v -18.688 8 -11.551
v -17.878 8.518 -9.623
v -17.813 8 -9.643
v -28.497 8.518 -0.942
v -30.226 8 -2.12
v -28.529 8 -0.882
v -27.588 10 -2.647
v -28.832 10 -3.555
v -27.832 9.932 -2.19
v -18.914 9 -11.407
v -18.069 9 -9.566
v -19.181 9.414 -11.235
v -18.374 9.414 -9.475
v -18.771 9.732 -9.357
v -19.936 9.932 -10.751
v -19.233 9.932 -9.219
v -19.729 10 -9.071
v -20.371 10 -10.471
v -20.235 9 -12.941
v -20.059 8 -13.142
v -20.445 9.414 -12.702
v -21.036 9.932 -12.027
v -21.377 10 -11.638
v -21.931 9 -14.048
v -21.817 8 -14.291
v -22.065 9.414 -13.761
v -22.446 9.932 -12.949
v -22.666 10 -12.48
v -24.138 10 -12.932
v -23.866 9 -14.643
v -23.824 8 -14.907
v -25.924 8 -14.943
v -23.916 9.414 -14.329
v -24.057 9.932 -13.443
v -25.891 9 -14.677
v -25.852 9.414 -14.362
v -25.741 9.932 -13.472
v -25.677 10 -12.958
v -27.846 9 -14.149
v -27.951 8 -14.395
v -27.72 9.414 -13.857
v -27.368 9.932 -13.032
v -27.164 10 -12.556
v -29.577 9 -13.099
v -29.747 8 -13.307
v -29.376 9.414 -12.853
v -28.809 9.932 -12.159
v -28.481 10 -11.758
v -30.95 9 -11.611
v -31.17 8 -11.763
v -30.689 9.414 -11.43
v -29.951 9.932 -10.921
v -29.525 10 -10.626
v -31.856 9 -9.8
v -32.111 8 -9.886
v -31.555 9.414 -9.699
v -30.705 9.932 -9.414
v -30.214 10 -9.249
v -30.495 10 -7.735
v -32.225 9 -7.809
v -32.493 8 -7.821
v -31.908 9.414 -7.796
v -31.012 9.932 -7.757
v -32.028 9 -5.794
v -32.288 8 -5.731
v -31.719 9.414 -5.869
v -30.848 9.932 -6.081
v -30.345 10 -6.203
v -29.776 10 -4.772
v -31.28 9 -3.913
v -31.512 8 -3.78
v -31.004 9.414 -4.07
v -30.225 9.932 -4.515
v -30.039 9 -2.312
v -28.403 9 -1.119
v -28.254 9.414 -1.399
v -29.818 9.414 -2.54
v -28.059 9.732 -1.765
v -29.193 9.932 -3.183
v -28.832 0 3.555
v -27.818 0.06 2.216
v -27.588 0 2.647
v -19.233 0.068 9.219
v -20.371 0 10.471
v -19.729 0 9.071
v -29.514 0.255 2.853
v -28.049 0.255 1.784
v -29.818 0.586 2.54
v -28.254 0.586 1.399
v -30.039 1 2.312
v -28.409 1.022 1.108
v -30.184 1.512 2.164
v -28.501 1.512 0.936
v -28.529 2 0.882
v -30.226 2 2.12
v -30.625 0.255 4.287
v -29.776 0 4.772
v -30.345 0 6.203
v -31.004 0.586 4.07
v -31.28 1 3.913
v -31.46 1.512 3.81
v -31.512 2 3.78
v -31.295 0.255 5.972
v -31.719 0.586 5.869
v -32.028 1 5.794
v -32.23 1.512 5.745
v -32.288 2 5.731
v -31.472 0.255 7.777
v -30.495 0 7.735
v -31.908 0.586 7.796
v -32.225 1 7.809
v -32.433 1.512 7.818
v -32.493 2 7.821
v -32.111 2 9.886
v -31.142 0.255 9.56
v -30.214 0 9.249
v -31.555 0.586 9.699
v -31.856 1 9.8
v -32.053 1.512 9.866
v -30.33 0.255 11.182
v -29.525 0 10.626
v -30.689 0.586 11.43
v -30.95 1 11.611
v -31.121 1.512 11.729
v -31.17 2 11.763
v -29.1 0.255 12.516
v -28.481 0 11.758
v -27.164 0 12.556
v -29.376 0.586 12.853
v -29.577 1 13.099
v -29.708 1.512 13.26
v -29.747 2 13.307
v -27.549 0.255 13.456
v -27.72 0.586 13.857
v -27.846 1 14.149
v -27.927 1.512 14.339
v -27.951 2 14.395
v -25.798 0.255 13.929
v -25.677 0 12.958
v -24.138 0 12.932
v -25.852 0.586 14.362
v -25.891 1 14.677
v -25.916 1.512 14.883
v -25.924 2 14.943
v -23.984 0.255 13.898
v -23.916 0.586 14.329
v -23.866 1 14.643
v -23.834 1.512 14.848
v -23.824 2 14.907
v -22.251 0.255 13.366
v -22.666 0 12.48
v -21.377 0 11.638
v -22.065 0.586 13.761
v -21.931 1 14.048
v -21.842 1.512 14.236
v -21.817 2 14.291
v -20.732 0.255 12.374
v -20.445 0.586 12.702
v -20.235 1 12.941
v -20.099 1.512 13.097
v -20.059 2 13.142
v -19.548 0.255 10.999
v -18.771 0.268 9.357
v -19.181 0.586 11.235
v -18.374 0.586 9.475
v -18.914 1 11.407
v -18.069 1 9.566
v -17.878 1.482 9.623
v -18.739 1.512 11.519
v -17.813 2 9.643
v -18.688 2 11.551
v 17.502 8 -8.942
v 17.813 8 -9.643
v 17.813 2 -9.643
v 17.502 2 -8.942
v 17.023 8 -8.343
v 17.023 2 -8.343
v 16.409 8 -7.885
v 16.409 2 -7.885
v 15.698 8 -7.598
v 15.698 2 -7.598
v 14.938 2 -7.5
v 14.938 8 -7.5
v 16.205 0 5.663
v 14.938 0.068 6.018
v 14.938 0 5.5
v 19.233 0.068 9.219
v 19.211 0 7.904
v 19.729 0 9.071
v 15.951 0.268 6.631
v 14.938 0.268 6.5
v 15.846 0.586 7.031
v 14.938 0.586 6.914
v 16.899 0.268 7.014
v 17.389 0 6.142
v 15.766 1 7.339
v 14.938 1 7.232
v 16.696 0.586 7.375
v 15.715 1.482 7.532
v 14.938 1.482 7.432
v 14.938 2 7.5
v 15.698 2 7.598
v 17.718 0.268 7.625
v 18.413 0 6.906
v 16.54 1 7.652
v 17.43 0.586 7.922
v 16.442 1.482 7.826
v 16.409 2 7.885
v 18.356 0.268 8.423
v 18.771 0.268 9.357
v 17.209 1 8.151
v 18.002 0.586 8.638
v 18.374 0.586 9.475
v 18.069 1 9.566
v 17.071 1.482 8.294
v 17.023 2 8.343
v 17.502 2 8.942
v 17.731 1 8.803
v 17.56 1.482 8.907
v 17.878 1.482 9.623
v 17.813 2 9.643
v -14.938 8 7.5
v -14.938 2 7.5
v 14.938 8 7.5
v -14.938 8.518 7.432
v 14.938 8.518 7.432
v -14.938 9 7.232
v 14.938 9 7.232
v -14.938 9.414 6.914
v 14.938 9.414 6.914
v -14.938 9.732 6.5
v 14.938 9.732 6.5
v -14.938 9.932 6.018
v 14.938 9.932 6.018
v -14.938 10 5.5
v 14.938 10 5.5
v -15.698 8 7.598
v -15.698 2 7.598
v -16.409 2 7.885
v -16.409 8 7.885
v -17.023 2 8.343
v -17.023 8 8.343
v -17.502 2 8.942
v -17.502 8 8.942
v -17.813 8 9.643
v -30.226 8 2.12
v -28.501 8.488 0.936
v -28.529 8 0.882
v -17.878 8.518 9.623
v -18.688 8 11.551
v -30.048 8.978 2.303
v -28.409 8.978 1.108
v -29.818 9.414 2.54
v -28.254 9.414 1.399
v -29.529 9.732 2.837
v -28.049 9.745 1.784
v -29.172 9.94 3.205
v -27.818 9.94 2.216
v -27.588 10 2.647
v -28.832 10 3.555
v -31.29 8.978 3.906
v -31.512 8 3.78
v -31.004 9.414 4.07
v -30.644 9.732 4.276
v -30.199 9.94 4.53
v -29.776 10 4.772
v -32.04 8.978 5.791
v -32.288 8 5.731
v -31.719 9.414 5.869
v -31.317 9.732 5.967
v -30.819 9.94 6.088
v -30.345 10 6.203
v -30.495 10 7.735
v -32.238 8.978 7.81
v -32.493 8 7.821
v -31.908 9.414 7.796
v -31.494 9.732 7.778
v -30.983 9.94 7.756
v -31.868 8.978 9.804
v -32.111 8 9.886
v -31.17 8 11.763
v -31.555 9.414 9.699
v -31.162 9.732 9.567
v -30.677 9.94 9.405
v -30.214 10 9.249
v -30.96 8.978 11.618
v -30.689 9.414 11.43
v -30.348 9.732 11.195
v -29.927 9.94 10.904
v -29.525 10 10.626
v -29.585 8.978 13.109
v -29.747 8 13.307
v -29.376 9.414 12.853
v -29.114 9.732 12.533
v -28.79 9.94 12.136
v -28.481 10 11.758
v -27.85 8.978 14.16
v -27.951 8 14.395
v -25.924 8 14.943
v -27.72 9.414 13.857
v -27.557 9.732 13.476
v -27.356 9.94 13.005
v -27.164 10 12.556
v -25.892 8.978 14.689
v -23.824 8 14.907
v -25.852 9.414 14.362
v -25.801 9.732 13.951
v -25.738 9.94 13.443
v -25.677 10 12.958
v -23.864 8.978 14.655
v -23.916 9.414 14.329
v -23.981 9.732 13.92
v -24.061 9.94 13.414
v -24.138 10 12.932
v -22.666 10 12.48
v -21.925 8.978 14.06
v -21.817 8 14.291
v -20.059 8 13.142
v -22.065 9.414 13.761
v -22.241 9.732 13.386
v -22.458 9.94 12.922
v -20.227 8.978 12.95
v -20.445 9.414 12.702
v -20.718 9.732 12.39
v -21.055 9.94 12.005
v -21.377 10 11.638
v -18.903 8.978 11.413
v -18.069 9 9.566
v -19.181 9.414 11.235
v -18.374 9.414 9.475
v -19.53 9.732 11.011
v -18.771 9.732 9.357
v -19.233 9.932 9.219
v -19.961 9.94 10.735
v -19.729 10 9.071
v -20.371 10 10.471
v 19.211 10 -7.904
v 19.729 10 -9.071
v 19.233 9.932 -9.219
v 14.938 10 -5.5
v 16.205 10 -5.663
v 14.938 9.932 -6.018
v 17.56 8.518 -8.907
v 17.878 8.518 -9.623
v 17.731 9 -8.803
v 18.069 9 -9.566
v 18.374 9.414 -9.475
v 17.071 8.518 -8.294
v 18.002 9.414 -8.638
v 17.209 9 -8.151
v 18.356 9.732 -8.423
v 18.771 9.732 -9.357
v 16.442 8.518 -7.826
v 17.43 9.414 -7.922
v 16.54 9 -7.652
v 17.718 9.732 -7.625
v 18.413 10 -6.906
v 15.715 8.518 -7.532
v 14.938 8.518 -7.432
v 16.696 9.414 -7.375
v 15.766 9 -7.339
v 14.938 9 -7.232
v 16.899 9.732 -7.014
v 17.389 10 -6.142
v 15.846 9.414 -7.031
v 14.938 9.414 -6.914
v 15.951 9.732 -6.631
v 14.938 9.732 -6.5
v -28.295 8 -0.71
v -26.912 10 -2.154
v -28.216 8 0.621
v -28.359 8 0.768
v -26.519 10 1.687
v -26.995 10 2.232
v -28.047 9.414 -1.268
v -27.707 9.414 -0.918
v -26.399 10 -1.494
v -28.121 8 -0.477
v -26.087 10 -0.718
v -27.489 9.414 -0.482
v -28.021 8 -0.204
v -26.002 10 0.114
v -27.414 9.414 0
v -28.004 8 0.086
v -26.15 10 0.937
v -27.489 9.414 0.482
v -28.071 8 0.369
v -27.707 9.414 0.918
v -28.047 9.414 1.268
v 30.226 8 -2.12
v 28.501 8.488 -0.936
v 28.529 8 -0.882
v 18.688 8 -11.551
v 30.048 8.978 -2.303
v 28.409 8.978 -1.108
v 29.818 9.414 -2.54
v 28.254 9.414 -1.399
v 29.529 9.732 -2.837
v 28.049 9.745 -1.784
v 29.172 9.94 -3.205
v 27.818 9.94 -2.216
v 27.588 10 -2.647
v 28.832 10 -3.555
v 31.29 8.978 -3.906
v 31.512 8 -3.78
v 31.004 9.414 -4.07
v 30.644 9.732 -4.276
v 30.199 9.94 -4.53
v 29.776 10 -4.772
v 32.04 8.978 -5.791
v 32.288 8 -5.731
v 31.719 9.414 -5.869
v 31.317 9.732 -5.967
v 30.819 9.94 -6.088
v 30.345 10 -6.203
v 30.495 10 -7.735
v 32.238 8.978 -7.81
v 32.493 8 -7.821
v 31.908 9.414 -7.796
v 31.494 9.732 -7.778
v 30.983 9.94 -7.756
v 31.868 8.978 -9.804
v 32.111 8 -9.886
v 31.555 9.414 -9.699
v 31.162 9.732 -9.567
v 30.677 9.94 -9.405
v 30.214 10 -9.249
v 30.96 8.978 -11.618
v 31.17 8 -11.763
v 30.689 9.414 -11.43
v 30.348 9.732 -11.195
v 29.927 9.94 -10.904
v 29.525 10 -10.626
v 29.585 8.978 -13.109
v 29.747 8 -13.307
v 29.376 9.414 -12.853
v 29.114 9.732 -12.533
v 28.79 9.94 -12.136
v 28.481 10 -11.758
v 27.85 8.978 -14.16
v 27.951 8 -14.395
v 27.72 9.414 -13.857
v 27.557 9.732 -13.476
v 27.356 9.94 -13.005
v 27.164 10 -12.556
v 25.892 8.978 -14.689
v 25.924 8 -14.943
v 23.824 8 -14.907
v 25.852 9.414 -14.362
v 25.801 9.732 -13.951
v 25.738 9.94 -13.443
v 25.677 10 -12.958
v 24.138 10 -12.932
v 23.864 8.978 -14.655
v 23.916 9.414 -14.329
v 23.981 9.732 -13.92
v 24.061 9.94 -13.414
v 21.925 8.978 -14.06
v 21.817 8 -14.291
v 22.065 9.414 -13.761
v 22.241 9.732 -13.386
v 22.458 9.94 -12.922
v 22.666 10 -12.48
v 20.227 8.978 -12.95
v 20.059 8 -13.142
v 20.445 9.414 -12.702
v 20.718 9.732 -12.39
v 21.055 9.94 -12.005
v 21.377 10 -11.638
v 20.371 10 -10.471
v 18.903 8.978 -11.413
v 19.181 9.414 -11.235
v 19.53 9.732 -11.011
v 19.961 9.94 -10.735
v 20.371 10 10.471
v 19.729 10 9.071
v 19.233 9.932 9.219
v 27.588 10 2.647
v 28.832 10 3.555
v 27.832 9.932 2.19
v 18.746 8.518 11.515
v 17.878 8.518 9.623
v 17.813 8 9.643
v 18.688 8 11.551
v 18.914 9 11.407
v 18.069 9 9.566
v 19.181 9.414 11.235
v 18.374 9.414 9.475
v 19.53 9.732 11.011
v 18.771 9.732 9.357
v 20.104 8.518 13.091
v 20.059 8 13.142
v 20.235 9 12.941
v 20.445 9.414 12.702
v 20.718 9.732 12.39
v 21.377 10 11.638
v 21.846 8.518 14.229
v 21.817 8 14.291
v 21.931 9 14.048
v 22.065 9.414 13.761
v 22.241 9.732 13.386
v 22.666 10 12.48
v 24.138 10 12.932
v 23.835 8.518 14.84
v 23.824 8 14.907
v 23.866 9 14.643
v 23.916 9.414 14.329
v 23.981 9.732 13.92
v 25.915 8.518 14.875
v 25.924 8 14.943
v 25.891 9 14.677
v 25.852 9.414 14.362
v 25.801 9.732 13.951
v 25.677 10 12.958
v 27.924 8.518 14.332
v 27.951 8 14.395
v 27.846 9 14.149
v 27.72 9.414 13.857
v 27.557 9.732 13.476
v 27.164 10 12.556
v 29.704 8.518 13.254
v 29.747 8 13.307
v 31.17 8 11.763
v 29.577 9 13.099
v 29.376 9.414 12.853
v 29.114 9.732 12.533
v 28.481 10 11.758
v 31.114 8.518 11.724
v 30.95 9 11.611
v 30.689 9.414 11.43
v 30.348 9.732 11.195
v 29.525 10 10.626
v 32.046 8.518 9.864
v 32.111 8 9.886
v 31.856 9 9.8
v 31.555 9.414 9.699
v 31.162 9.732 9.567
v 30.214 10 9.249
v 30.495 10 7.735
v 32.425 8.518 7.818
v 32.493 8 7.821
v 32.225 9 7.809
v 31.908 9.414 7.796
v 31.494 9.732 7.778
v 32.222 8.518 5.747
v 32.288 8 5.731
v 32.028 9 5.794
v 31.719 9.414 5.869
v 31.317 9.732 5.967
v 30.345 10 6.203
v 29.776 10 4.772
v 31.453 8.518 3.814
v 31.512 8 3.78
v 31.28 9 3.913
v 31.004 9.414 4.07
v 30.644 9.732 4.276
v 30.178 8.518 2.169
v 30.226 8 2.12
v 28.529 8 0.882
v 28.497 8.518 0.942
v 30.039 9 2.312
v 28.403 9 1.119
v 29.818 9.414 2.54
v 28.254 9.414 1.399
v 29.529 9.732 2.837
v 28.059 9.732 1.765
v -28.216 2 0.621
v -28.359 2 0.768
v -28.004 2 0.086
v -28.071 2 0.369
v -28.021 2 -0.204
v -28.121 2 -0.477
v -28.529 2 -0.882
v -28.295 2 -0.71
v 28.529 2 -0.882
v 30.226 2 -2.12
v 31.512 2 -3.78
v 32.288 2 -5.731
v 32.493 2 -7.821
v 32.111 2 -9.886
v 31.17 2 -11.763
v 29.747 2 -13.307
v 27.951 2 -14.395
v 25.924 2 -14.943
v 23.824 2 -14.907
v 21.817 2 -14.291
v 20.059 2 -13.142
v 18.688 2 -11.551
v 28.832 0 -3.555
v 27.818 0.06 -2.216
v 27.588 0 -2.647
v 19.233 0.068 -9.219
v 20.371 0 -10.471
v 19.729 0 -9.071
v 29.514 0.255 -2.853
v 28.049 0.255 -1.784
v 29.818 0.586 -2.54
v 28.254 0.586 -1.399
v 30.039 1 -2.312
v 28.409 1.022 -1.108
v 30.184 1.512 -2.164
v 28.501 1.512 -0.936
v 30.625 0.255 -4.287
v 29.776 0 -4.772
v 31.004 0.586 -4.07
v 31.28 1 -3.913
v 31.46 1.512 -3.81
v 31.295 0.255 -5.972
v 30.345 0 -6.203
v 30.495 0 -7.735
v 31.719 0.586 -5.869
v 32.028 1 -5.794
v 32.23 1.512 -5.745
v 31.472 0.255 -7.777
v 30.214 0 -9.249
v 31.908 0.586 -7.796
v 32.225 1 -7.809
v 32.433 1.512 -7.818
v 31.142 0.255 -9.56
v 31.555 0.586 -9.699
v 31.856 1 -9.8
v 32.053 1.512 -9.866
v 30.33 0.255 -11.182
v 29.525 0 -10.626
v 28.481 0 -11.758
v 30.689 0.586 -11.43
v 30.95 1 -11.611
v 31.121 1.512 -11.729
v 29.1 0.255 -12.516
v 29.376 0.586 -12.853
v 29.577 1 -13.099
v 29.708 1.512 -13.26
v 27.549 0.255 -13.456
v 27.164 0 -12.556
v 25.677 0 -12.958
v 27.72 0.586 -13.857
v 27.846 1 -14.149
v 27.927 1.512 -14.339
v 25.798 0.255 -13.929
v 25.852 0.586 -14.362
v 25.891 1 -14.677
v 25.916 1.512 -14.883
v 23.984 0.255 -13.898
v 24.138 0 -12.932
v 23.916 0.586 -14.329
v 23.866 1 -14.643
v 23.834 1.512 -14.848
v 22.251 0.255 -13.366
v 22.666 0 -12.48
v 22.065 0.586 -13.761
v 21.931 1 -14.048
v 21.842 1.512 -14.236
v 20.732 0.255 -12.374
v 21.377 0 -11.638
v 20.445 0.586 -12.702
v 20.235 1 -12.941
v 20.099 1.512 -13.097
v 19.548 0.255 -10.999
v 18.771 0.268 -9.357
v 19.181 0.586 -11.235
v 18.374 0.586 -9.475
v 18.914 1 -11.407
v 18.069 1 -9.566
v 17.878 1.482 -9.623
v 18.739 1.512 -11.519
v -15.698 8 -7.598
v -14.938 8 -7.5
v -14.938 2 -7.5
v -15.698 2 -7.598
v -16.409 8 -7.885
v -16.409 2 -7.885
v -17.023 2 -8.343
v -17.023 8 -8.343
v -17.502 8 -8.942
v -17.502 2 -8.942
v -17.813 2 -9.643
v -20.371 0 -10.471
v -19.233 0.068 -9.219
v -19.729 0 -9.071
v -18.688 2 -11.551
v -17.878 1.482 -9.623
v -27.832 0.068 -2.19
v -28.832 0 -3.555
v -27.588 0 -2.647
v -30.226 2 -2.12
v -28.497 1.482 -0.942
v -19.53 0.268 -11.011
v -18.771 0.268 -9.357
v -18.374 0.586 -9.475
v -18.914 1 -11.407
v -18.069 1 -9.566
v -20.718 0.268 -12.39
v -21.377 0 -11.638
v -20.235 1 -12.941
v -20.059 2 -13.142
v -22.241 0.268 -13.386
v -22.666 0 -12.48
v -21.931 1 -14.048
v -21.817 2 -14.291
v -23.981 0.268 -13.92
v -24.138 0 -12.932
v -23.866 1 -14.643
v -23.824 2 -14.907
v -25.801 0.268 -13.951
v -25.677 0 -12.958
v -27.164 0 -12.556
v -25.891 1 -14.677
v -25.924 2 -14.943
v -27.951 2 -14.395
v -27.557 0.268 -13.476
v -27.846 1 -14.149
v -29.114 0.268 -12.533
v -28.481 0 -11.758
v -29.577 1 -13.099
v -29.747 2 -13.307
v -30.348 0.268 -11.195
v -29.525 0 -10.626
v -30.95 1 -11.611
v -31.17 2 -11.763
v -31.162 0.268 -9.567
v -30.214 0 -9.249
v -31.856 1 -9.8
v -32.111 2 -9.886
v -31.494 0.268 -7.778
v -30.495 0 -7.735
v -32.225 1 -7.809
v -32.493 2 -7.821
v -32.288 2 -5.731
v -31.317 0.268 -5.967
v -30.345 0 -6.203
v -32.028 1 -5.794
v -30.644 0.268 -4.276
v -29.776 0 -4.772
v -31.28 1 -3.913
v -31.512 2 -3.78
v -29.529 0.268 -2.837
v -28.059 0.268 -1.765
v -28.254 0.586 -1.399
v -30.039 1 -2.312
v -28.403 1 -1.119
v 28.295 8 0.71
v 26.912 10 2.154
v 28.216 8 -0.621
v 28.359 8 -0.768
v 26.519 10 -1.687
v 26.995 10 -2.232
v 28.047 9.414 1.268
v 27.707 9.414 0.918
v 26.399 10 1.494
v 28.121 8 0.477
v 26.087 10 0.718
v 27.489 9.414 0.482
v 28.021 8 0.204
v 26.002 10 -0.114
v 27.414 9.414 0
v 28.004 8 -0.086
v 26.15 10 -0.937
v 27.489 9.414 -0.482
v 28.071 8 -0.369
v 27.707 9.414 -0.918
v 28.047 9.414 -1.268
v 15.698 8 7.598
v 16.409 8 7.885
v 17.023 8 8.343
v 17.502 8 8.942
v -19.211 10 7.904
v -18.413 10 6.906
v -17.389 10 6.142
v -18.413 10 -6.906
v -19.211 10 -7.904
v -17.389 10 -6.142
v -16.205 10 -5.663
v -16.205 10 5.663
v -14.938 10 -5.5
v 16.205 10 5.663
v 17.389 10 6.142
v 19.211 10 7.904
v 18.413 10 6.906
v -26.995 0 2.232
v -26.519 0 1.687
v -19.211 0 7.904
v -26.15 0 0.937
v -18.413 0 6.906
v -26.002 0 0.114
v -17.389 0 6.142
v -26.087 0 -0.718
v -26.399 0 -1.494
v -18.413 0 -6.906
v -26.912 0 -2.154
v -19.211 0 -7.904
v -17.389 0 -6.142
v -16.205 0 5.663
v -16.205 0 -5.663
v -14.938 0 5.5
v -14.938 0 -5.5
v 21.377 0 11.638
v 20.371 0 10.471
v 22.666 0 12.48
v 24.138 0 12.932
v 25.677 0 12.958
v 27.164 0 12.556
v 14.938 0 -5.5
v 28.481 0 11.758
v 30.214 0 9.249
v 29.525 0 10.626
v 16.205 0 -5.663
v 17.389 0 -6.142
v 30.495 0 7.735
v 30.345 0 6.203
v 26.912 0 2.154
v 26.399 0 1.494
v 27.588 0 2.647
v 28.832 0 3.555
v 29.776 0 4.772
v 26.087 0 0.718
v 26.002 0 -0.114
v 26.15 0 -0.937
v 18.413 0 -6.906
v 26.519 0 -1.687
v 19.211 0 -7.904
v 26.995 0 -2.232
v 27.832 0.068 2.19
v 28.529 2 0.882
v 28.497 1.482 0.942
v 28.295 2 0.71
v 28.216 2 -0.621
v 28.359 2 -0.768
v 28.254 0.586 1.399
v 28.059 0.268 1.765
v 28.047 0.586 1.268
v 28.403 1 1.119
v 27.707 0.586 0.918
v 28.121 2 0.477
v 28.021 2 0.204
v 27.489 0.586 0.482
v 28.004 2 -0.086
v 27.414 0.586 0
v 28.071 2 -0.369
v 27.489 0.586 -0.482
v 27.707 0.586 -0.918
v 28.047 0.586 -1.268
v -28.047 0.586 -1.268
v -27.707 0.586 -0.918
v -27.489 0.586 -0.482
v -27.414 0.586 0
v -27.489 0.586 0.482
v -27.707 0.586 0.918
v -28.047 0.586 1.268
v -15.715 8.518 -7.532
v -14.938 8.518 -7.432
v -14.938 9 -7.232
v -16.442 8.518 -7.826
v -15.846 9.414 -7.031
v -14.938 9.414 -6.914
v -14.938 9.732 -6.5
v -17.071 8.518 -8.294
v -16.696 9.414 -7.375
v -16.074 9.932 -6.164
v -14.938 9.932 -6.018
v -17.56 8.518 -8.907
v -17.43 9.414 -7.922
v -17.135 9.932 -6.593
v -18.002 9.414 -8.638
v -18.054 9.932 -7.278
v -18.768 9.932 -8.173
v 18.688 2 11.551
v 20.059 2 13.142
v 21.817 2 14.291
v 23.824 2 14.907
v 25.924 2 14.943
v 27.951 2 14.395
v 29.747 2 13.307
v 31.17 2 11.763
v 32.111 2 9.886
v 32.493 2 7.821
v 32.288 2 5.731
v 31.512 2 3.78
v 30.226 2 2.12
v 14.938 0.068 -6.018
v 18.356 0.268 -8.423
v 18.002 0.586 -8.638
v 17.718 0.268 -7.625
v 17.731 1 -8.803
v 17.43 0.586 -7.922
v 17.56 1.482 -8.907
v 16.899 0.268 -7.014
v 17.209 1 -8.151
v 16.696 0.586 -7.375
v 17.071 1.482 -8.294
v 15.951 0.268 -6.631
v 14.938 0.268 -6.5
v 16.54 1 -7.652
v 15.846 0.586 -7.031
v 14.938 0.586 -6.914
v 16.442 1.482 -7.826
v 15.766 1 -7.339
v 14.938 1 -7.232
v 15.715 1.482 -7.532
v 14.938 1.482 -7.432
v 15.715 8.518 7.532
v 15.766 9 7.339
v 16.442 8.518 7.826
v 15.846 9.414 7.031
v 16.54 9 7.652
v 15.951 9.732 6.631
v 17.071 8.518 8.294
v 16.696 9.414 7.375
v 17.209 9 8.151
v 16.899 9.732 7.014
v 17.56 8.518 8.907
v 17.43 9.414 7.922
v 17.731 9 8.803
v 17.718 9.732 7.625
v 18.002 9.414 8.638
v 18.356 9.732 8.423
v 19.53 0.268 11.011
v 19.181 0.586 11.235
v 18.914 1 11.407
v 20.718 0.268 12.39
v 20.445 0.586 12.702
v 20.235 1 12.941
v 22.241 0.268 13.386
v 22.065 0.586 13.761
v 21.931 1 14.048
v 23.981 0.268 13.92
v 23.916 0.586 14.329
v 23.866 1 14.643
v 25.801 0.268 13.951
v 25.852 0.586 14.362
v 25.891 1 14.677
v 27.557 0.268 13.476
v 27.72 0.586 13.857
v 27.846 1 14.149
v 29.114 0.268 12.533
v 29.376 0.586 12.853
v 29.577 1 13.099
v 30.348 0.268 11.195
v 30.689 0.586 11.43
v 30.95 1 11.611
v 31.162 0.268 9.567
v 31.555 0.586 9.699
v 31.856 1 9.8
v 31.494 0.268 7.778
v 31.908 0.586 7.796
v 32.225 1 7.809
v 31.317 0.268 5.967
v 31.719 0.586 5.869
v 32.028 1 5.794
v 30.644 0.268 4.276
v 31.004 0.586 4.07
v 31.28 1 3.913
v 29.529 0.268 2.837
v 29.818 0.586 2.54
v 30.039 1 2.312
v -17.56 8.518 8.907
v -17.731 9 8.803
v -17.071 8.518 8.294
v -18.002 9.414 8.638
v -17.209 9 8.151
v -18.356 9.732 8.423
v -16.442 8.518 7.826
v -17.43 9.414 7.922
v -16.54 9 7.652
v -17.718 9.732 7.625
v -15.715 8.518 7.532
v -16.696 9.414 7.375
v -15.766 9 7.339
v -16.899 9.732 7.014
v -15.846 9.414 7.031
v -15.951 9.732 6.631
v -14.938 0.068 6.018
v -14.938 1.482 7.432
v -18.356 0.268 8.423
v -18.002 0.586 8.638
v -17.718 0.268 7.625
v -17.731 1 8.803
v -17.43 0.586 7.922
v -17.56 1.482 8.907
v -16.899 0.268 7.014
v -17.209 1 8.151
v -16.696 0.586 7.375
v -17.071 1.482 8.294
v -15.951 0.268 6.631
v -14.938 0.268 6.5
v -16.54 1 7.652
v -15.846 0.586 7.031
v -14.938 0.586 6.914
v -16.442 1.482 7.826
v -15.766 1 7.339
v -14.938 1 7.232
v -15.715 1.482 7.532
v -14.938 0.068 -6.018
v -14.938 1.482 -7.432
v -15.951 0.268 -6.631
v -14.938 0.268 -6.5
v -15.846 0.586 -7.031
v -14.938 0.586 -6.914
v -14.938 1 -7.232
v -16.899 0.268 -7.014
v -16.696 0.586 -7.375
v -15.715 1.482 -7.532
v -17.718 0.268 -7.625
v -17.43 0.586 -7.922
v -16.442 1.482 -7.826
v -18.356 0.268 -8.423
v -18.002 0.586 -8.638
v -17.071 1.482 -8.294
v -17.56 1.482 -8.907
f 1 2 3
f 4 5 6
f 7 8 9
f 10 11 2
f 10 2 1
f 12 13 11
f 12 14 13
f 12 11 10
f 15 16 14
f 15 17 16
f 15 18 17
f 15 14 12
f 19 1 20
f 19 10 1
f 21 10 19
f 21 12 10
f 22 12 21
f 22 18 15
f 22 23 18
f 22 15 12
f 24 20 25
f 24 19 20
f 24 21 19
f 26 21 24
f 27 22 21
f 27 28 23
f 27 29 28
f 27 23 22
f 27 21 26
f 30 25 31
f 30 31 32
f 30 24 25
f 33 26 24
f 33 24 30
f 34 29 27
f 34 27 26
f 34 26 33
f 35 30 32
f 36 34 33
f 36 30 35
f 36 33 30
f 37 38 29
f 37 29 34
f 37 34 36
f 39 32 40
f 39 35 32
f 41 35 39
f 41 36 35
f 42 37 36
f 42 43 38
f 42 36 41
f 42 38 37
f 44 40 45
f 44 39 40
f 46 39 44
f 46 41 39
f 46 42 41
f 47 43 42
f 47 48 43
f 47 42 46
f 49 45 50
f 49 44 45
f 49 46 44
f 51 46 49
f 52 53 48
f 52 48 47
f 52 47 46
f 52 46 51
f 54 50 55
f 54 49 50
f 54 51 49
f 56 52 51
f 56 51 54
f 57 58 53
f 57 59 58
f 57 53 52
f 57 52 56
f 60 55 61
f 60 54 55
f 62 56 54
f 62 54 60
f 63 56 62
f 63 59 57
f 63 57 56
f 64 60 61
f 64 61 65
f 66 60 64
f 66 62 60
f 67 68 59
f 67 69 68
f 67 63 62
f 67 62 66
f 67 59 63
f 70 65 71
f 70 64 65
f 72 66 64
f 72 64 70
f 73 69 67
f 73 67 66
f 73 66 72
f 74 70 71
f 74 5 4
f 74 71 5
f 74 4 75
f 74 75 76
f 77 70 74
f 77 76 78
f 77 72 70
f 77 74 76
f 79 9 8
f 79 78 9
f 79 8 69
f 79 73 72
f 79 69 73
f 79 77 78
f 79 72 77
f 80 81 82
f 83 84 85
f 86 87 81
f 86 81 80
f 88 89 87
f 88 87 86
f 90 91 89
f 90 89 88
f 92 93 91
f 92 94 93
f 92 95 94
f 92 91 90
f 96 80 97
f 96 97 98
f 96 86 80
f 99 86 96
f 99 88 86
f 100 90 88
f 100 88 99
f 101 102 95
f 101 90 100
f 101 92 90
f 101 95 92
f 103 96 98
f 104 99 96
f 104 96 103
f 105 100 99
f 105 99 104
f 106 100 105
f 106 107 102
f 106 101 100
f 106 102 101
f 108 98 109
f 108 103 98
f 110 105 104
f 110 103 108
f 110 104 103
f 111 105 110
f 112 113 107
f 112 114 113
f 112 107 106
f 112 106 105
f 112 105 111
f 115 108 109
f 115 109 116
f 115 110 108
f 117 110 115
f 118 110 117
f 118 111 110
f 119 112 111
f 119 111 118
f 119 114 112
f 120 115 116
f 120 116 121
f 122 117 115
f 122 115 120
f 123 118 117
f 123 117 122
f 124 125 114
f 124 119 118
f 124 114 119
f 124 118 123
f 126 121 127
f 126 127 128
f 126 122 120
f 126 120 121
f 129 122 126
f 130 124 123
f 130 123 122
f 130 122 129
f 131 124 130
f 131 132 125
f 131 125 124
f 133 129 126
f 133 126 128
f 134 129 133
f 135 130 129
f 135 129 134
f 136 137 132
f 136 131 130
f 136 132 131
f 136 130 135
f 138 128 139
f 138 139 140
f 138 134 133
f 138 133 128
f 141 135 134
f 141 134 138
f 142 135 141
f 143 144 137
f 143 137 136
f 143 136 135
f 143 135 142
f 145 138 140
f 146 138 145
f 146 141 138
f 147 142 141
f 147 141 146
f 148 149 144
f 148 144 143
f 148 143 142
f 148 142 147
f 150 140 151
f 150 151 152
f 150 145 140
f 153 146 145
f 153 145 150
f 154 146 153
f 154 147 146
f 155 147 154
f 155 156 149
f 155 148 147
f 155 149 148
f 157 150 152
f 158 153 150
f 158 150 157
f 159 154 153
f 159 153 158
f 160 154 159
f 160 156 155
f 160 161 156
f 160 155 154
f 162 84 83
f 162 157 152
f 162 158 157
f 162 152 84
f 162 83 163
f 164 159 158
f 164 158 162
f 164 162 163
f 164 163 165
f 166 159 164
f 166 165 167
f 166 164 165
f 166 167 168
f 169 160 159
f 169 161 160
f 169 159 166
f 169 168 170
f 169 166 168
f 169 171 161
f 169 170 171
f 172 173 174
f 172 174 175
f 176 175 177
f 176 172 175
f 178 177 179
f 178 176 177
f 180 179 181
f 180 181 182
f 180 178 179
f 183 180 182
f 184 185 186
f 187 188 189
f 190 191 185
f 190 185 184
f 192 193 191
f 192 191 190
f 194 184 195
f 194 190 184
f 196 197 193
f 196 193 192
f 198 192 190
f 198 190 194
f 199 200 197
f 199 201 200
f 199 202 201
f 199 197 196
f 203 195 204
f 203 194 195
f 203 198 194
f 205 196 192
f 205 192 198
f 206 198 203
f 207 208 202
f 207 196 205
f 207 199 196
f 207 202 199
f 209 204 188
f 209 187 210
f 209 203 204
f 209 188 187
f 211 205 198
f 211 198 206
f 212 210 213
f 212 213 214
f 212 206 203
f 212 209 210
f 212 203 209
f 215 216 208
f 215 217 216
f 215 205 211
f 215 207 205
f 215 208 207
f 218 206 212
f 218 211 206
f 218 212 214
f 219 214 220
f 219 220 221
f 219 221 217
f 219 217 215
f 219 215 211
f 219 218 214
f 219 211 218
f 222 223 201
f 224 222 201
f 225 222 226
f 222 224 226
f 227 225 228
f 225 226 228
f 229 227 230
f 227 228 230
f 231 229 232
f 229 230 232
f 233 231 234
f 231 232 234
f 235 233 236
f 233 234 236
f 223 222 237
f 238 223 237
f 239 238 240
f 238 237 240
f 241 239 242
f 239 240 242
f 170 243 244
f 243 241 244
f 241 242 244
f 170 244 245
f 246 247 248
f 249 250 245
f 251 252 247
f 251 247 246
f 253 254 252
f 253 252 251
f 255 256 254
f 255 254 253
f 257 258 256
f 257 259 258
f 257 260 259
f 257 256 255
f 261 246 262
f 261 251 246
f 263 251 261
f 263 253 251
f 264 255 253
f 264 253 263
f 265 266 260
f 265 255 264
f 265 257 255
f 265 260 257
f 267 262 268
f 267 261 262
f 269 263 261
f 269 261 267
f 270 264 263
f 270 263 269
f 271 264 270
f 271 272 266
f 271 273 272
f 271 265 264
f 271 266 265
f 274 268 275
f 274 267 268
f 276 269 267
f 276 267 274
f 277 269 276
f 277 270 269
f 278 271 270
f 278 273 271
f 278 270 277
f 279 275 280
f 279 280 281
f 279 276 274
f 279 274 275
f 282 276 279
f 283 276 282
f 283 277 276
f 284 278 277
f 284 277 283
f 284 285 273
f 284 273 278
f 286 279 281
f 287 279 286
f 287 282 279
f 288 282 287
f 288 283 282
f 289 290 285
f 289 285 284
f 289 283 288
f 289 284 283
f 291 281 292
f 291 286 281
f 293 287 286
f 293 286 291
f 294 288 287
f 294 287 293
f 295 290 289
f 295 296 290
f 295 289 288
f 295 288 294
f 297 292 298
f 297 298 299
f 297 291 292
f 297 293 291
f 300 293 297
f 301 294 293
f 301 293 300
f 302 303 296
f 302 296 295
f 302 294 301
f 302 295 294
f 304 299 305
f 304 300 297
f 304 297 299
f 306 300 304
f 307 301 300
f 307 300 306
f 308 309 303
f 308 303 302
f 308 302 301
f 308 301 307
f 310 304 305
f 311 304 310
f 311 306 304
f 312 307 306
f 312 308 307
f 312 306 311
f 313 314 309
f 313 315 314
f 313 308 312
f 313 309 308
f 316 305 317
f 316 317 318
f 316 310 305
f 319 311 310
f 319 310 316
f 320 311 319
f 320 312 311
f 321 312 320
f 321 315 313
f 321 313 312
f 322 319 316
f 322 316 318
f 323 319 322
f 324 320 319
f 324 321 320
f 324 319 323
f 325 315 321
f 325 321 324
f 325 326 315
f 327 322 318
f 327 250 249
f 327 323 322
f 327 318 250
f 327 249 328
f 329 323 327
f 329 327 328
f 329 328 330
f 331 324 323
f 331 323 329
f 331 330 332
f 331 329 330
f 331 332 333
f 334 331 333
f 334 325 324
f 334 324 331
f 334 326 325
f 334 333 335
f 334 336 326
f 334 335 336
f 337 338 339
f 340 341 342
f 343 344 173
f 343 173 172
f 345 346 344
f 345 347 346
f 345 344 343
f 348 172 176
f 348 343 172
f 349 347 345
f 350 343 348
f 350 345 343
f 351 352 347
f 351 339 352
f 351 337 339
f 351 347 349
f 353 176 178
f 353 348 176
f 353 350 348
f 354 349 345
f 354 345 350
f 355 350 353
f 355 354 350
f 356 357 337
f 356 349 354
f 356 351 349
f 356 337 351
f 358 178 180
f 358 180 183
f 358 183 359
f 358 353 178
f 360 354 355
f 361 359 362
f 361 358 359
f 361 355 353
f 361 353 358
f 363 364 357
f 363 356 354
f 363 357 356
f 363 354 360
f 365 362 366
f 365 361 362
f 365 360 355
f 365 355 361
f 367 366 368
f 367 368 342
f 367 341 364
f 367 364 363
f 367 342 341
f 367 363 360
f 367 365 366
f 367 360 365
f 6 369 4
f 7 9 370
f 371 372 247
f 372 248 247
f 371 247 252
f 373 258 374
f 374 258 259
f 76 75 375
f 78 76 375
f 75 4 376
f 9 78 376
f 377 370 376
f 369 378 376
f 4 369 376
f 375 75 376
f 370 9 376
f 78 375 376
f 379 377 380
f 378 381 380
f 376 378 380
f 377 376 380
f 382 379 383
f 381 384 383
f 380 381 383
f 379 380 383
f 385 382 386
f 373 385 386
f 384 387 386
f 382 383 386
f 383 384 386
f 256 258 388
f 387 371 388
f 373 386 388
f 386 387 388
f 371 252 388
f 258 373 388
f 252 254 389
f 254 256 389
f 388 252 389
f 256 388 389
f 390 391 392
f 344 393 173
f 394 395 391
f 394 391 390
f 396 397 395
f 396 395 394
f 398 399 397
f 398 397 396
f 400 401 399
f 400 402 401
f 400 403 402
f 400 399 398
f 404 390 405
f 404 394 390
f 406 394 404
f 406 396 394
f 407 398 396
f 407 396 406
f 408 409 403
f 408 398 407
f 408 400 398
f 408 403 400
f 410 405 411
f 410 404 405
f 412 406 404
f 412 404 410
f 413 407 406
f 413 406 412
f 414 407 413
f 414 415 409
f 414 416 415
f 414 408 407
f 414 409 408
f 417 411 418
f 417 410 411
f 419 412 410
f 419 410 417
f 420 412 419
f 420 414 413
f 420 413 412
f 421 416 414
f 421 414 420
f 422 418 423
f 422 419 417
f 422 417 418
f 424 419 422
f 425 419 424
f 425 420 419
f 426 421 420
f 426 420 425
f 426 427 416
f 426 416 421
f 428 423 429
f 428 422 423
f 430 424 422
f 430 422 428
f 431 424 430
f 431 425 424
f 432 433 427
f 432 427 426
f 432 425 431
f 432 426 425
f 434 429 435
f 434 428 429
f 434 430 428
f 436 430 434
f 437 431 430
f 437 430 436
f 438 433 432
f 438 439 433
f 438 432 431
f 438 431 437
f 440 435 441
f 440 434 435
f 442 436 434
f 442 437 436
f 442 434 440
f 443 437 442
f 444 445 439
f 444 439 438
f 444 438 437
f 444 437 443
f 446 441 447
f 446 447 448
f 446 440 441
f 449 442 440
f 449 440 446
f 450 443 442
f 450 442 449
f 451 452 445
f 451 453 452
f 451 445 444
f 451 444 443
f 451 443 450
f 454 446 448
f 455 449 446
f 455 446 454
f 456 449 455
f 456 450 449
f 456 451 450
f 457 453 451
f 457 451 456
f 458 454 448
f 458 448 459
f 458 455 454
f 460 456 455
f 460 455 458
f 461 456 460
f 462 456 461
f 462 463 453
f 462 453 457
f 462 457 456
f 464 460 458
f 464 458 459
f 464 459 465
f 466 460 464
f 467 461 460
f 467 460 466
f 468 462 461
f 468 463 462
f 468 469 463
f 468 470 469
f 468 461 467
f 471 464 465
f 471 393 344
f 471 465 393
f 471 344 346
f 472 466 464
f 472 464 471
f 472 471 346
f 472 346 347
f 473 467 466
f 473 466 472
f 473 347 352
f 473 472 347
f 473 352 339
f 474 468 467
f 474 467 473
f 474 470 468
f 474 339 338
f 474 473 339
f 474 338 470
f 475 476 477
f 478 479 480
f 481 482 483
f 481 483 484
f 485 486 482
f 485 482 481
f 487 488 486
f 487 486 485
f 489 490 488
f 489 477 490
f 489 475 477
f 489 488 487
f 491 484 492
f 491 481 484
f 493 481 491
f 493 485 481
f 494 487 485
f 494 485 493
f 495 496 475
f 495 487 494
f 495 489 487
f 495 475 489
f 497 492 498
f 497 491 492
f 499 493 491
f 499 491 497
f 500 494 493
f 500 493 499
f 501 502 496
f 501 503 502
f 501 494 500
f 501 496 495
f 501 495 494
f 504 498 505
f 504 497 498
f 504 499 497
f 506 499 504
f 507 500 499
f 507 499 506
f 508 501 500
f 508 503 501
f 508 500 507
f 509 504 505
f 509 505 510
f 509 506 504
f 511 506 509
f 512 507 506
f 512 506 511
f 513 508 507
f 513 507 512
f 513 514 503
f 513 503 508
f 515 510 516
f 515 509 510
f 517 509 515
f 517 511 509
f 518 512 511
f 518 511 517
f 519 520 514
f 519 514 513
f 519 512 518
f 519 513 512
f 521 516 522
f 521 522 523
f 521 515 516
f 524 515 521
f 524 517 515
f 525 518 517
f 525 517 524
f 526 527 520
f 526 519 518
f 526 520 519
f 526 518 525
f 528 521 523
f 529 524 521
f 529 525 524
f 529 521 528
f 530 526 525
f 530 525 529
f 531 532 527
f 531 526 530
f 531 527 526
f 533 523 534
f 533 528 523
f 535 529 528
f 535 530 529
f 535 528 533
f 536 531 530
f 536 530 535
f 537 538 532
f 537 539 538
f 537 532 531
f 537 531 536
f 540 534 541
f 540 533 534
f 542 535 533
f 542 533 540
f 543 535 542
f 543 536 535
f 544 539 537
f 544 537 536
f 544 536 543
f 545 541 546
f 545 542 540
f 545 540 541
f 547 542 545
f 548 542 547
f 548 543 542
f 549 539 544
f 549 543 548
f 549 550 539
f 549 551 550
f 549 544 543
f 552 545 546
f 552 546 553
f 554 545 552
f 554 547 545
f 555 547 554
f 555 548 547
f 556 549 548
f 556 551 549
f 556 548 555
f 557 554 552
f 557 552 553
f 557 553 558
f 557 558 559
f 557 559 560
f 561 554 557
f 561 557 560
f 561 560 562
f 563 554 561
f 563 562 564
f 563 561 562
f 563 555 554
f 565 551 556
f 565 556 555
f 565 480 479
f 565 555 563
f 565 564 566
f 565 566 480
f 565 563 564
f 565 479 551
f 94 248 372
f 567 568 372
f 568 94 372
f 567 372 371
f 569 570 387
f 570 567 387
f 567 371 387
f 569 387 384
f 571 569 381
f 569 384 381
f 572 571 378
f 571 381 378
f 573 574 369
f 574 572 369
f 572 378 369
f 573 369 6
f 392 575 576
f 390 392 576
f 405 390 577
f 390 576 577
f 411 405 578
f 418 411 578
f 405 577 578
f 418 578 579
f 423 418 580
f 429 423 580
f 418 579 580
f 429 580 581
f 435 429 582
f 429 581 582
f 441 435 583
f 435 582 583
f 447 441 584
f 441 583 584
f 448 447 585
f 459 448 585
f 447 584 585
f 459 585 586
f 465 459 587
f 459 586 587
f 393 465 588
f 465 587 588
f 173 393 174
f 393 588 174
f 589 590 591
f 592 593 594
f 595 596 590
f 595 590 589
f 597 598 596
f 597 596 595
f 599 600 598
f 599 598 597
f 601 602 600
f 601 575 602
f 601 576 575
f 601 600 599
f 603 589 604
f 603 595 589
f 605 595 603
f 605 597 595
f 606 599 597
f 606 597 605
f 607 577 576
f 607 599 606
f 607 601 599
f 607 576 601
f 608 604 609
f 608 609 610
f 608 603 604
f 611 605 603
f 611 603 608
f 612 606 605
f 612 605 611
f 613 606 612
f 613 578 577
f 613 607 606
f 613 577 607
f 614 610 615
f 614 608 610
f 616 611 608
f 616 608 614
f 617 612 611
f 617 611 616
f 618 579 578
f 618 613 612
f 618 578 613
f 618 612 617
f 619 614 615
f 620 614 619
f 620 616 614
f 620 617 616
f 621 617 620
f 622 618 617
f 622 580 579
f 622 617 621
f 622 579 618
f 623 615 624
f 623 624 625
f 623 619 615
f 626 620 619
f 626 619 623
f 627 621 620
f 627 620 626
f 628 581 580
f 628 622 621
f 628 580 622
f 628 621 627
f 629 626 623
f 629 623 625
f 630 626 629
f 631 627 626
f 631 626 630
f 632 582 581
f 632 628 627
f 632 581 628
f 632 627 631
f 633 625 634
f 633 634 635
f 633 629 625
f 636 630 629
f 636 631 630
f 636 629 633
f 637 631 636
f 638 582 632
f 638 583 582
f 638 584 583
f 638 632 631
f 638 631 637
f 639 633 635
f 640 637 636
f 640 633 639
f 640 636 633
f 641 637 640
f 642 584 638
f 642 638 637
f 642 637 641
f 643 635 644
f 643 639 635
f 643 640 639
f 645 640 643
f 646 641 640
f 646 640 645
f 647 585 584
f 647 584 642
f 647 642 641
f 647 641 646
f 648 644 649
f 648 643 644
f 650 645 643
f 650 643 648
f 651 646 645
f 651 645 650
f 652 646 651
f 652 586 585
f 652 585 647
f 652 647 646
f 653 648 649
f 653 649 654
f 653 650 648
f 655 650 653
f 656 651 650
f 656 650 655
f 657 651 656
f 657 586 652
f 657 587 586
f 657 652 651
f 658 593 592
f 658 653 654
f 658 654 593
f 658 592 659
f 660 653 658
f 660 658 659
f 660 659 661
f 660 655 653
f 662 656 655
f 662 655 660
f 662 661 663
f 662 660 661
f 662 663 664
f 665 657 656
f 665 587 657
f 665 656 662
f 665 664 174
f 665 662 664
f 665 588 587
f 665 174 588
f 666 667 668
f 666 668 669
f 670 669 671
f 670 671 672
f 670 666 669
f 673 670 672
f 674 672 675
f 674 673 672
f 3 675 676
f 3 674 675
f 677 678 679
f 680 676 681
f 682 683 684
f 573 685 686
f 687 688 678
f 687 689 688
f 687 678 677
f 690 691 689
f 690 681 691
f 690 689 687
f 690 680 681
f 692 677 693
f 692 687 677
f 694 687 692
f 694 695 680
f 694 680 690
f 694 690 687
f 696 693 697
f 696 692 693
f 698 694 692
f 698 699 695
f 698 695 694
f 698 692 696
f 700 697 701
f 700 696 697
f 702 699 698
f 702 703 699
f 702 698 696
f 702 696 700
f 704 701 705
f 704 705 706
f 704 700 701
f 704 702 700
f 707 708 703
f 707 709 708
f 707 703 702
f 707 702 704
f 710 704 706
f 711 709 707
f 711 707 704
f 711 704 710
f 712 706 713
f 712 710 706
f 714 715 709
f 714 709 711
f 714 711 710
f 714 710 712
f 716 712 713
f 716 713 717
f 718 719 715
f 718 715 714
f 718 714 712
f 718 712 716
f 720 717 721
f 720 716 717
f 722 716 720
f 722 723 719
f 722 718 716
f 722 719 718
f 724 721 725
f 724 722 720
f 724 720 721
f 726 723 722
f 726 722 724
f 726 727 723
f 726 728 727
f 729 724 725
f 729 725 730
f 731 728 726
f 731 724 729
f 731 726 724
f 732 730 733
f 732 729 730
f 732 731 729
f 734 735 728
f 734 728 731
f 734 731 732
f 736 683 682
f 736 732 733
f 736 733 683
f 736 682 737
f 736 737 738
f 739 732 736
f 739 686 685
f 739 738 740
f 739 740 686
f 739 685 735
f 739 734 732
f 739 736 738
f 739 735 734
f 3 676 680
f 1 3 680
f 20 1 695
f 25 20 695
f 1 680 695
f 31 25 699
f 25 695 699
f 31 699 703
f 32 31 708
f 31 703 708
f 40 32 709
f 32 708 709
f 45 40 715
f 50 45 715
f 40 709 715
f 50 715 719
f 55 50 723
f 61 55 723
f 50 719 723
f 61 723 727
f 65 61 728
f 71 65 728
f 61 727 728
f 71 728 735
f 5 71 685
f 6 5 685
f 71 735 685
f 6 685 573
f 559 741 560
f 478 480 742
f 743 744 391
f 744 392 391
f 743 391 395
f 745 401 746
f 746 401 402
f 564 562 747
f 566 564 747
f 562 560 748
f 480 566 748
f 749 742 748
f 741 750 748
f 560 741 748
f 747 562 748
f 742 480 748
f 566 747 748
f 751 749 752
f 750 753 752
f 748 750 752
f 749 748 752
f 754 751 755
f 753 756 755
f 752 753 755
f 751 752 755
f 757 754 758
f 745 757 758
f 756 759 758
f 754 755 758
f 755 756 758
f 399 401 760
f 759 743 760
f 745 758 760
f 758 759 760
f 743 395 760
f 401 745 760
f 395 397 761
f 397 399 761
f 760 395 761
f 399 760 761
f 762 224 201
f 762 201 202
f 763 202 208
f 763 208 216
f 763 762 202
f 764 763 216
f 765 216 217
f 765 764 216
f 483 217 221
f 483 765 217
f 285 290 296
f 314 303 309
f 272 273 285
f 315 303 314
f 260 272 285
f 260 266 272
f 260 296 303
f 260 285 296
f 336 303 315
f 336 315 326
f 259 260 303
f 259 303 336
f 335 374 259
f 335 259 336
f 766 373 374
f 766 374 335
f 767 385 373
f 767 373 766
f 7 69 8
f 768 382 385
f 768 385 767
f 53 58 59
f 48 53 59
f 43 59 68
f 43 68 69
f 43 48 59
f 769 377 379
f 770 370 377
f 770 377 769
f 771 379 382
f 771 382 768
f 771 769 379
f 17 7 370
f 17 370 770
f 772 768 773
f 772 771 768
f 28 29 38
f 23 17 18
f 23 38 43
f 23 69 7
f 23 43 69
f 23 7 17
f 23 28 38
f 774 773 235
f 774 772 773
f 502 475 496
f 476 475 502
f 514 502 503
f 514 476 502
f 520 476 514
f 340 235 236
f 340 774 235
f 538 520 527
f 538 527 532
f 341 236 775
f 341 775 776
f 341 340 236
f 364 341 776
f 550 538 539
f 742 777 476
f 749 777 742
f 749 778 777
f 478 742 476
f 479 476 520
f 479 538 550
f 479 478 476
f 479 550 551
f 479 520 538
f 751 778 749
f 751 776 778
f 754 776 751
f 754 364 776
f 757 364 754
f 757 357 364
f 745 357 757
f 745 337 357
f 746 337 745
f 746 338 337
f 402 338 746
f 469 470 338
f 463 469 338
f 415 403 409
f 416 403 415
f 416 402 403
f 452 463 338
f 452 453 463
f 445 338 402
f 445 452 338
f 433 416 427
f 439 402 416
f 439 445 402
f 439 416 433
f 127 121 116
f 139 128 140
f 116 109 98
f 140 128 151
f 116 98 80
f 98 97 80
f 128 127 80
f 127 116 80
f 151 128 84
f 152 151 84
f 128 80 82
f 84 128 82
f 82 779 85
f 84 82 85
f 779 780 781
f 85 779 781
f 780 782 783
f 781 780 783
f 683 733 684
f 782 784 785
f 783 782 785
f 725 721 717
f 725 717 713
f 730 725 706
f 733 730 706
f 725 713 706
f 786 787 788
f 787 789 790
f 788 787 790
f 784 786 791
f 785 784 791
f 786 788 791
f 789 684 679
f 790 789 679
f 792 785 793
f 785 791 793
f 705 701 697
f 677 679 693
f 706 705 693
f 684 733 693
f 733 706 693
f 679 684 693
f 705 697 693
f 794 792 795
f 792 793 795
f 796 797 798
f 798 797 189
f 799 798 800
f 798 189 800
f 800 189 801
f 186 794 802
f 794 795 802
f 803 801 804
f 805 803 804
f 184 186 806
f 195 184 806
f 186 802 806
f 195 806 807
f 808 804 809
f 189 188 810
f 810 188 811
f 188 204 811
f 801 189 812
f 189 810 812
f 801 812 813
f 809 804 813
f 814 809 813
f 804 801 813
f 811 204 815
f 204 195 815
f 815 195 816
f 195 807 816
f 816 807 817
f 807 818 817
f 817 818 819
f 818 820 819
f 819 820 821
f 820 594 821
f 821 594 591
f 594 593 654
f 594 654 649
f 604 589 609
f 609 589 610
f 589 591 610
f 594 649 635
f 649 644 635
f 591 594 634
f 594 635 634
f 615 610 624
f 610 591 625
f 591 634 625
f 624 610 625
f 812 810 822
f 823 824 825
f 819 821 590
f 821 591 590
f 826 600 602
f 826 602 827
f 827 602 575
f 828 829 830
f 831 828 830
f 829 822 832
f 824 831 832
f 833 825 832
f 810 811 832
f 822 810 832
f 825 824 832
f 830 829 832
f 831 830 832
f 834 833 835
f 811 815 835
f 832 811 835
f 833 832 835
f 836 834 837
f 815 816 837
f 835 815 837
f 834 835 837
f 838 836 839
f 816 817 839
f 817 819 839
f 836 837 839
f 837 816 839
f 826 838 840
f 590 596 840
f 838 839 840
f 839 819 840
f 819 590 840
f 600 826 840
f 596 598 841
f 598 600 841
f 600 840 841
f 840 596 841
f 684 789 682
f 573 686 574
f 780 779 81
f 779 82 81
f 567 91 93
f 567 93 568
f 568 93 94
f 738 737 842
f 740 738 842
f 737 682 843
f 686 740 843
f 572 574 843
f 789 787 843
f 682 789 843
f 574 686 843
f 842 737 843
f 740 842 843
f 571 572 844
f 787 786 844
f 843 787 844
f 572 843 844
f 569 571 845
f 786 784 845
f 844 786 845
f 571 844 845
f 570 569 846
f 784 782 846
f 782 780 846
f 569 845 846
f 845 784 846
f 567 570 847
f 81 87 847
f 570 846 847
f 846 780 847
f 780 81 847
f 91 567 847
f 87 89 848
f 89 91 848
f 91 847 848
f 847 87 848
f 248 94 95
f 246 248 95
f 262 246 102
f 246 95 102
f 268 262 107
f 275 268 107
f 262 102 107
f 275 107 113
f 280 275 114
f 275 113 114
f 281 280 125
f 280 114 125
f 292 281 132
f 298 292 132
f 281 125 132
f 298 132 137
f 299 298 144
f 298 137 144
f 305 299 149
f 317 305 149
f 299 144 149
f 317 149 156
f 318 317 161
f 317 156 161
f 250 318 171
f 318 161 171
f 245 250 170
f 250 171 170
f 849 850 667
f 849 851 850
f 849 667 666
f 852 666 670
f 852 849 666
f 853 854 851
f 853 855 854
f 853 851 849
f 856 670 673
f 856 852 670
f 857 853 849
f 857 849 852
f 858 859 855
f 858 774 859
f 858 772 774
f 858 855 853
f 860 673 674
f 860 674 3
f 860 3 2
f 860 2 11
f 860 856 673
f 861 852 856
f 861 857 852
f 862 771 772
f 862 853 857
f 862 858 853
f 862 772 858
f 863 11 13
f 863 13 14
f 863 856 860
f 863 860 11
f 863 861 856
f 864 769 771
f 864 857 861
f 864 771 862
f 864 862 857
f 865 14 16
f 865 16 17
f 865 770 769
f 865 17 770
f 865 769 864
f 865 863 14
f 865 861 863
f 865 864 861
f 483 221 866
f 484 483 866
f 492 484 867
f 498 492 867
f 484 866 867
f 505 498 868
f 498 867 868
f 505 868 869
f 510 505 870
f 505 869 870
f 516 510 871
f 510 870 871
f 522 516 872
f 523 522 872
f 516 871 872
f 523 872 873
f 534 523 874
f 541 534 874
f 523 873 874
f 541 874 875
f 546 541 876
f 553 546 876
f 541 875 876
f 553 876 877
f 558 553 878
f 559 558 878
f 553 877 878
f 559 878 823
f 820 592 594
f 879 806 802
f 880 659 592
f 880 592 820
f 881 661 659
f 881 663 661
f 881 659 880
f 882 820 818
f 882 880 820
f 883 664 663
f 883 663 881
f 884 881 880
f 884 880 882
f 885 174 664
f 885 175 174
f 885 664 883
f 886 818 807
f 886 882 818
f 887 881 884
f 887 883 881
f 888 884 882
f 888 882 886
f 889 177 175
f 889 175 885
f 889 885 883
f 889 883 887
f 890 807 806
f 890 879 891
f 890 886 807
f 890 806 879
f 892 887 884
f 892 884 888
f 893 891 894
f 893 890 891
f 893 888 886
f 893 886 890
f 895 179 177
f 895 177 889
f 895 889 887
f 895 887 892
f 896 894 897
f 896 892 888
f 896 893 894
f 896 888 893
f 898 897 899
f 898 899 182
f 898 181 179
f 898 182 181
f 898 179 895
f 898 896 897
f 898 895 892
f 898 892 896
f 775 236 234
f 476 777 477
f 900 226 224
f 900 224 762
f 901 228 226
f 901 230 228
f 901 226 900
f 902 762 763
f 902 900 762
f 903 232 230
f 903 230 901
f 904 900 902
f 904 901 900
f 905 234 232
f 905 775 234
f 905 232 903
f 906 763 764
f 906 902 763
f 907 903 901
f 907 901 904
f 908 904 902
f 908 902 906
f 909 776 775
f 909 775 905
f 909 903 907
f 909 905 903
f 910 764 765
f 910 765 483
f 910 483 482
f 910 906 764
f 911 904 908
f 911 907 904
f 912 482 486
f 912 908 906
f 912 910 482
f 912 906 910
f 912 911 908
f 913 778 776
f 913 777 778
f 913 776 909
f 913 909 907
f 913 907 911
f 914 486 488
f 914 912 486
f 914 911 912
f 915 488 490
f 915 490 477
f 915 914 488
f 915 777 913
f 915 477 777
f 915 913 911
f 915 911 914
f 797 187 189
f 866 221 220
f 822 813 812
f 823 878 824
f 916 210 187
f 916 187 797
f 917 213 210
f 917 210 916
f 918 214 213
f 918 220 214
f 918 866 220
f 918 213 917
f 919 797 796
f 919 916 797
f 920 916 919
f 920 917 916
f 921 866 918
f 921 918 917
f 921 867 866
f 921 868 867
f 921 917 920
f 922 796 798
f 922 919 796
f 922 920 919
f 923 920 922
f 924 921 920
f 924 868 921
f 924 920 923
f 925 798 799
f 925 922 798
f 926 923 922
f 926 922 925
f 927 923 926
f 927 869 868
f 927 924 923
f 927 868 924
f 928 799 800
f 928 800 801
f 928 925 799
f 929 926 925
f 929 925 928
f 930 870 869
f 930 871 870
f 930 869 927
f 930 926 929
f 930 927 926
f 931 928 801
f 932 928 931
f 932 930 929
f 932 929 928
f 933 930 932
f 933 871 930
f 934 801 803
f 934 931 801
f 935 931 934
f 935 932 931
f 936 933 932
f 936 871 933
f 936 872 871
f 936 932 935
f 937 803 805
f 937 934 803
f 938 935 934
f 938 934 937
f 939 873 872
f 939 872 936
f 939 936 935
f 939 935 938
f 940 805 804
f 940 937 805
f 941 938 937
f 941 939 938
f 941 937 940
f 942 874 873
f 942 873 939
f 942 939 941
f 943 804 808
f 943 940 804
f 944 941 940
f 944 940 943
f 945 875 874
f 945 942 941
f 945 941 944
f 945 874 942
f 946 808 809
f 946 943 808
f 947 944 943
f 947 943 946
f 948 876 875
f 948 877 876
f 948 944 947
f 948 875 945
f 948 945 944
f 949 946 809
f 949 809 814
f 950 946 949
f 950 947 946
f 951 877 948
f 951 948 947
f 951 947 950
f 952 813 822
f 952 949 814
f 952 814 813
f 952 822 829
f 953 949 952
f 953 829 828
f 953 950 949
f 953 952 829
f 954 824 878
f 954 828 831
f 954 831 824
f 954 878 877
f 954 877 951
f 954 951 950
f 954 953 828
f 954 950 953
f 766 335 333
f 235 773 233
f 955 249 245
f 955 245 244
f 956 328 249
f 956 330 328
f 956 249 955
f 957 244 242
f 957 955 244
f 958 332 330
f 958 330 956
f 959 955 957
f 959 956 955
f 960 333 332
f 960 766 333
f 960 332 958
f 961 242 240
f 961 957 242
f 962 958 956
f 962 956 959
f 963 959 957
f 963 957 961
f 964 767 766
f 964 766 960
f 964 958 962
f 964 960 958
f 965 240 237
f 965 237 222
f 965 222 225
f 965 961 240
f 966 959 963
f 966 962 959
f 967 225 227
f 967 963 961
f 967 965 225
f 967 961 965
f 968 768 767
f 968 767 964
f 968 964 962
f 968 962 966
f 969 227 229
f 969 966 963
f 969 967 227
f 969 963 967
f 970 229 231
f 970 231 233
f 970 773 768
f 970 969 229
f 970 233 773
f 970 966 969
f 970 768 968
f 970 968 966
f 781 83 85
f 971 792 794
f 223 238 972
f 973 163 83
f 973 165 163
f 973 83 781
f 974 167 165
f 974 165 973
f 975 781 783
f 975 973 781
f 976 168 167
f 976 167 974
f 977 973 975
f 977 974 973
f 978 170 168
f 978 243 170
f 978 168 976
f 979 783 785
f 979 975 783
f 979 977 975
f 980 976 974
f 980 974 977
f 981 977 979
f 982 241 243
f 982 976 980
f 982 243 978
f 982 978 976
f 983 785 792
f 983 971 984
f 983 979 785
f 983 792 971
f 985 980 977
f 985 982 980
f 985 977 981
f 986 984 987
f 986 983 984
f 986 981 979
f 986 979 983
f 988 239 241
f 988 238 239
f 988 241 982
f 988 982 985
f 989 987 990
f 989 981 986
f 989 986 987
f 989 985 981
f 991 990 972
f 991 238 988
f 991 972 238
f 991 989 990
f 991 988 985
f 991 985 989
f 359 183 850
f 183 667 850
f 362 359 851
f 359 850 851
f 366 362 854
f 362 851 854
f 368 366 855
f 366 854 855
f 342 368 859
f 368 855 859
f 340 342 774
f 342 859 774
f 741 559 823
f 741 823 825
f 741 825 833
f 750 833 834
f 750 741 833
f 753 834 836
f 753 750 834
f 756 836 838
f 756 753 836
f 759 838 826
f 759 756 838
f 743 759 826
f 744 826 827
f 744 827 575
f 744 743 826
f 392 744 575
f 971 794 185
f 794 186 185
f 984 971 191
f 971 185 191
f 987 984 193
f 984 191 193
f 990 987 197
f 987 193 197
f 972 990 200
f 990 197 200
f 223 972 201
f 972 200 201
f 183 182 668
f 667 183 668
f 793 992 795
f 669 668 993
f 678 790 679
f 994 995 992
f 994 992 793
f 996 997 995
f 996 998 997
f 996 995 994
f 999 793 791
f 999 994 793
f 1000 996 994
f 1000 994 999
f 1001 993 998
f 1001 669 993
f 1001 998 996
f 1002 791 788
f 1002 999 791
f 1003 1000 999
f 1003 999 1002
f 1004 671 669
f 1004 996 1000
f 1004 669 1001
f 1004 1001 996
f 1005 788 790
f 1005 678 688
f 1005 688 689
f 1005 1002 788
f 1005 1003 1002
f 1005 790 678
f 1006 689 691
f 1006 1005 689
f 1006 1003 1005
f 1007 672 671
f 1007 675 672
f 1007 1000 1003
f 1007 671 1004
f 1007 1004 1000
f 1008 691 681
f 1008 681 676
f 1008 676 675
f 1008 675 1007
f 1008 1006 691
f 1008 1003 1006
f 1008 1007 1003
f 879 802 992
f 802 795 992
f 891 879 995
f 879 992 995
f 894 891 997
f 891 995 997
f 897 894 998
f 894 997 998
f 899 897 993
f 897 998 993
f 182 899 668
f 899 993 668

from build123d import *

# Parameters (mm, degrees)
BOSS_EXTRUDE1_DEPTH = 10
FILLET3_R           = 3
FILLET4_R           = 1
FILLET5_R           = 2


with BuildPart() as part:
    # Sketch1 → Boss-Extrude1 (new body)
    with BuildSketch(Plane(origin=(0, 0, 0), x_dir=(1, 0, 0), z_dir=(0, 1, 0))):
        with BuildLine():
            Line((-17.5, -7.5), (17.5, -7.5))
            ThreePointArc((17.5, -7.5), (30.303300859, -12.803300859), (25, 0))
            ThreePointArc((25, 0), (30.303300859, 12.803300859), (17.5, 7.5))
            Line((17.5, 7.5), (-17.5, 7.5))
            ThreePointArc((-17.5, 7.5), (-30.303300859, 12.803300859), (-25, 0))
            ThreePointArc((-25, 0), (-30.303300859, -12.803300859), (-17.5, -7.5))
        make_face()
    extrude(amount=BOSS_EXTRUDE1_DEPTH)

    # Fillet3
    fillet3_edges = [part.edges().sort_by_distance(p)[0] for p in [
        (17.5, 5, 7.5),
        (-17.5, 5, 7.5),
        (-17.5, 5, -7.5),
        (17.5, 5, -7.5),
    ]]
    fillet(fillet3_edges, radius=FILLET3_R)

    # Fillet4
    fillet4_edges = [part.edges().sort_by_distance(p)[0] for p in [
        (-25, 5, 0),
        (25, 5, 0),
    ]]
    fillet(fillet4_edges, radius=FILLET4_R)

    # Fillet5
    fillet5_edges = [part.edges().sort_by_distance(p)[0] for p in [
        (-29.74676282, 0, -13.306741145),
        (-29.74676282, 10, -13.306741145),
        (0, 0, -7.5),
        (0, 10, -7.5),
        (29.74676282, 0, 13.306741145),
        (29.74676282, 10, 13.306741145),
        (0, 0, 7.5),
        (0, 10, 7.5),
        (-16.730537015, 0, -8.094648823),
        (-16.730537015, 10, -8.094648823),
        (16.730537015, 0, -8.094648823),
        (16.730537015, 10, -8.094648823),
        (16.730537015, 0, 8.094648823),
        (16.730537015, 10, 8.094648823),
        (-16.730537015, 0, 8.094648823),
        (-16.730537015, 10, 8.094648823),
        (-29.74676282, 0, 13.306741145),
        (-29.74676282, 10, 13.306741145),
        (29.74676282, 0, -13.306741145),
        (29.74676282, 10, -13.306741145),
        (-28, 0, 0),
        (-28, 10, 0),
        (28, 0, 0),
        (28, 10, 0),
    ]]
    fillet(fillet5_edges, radius=FILLET5_R)


solid = part.part
